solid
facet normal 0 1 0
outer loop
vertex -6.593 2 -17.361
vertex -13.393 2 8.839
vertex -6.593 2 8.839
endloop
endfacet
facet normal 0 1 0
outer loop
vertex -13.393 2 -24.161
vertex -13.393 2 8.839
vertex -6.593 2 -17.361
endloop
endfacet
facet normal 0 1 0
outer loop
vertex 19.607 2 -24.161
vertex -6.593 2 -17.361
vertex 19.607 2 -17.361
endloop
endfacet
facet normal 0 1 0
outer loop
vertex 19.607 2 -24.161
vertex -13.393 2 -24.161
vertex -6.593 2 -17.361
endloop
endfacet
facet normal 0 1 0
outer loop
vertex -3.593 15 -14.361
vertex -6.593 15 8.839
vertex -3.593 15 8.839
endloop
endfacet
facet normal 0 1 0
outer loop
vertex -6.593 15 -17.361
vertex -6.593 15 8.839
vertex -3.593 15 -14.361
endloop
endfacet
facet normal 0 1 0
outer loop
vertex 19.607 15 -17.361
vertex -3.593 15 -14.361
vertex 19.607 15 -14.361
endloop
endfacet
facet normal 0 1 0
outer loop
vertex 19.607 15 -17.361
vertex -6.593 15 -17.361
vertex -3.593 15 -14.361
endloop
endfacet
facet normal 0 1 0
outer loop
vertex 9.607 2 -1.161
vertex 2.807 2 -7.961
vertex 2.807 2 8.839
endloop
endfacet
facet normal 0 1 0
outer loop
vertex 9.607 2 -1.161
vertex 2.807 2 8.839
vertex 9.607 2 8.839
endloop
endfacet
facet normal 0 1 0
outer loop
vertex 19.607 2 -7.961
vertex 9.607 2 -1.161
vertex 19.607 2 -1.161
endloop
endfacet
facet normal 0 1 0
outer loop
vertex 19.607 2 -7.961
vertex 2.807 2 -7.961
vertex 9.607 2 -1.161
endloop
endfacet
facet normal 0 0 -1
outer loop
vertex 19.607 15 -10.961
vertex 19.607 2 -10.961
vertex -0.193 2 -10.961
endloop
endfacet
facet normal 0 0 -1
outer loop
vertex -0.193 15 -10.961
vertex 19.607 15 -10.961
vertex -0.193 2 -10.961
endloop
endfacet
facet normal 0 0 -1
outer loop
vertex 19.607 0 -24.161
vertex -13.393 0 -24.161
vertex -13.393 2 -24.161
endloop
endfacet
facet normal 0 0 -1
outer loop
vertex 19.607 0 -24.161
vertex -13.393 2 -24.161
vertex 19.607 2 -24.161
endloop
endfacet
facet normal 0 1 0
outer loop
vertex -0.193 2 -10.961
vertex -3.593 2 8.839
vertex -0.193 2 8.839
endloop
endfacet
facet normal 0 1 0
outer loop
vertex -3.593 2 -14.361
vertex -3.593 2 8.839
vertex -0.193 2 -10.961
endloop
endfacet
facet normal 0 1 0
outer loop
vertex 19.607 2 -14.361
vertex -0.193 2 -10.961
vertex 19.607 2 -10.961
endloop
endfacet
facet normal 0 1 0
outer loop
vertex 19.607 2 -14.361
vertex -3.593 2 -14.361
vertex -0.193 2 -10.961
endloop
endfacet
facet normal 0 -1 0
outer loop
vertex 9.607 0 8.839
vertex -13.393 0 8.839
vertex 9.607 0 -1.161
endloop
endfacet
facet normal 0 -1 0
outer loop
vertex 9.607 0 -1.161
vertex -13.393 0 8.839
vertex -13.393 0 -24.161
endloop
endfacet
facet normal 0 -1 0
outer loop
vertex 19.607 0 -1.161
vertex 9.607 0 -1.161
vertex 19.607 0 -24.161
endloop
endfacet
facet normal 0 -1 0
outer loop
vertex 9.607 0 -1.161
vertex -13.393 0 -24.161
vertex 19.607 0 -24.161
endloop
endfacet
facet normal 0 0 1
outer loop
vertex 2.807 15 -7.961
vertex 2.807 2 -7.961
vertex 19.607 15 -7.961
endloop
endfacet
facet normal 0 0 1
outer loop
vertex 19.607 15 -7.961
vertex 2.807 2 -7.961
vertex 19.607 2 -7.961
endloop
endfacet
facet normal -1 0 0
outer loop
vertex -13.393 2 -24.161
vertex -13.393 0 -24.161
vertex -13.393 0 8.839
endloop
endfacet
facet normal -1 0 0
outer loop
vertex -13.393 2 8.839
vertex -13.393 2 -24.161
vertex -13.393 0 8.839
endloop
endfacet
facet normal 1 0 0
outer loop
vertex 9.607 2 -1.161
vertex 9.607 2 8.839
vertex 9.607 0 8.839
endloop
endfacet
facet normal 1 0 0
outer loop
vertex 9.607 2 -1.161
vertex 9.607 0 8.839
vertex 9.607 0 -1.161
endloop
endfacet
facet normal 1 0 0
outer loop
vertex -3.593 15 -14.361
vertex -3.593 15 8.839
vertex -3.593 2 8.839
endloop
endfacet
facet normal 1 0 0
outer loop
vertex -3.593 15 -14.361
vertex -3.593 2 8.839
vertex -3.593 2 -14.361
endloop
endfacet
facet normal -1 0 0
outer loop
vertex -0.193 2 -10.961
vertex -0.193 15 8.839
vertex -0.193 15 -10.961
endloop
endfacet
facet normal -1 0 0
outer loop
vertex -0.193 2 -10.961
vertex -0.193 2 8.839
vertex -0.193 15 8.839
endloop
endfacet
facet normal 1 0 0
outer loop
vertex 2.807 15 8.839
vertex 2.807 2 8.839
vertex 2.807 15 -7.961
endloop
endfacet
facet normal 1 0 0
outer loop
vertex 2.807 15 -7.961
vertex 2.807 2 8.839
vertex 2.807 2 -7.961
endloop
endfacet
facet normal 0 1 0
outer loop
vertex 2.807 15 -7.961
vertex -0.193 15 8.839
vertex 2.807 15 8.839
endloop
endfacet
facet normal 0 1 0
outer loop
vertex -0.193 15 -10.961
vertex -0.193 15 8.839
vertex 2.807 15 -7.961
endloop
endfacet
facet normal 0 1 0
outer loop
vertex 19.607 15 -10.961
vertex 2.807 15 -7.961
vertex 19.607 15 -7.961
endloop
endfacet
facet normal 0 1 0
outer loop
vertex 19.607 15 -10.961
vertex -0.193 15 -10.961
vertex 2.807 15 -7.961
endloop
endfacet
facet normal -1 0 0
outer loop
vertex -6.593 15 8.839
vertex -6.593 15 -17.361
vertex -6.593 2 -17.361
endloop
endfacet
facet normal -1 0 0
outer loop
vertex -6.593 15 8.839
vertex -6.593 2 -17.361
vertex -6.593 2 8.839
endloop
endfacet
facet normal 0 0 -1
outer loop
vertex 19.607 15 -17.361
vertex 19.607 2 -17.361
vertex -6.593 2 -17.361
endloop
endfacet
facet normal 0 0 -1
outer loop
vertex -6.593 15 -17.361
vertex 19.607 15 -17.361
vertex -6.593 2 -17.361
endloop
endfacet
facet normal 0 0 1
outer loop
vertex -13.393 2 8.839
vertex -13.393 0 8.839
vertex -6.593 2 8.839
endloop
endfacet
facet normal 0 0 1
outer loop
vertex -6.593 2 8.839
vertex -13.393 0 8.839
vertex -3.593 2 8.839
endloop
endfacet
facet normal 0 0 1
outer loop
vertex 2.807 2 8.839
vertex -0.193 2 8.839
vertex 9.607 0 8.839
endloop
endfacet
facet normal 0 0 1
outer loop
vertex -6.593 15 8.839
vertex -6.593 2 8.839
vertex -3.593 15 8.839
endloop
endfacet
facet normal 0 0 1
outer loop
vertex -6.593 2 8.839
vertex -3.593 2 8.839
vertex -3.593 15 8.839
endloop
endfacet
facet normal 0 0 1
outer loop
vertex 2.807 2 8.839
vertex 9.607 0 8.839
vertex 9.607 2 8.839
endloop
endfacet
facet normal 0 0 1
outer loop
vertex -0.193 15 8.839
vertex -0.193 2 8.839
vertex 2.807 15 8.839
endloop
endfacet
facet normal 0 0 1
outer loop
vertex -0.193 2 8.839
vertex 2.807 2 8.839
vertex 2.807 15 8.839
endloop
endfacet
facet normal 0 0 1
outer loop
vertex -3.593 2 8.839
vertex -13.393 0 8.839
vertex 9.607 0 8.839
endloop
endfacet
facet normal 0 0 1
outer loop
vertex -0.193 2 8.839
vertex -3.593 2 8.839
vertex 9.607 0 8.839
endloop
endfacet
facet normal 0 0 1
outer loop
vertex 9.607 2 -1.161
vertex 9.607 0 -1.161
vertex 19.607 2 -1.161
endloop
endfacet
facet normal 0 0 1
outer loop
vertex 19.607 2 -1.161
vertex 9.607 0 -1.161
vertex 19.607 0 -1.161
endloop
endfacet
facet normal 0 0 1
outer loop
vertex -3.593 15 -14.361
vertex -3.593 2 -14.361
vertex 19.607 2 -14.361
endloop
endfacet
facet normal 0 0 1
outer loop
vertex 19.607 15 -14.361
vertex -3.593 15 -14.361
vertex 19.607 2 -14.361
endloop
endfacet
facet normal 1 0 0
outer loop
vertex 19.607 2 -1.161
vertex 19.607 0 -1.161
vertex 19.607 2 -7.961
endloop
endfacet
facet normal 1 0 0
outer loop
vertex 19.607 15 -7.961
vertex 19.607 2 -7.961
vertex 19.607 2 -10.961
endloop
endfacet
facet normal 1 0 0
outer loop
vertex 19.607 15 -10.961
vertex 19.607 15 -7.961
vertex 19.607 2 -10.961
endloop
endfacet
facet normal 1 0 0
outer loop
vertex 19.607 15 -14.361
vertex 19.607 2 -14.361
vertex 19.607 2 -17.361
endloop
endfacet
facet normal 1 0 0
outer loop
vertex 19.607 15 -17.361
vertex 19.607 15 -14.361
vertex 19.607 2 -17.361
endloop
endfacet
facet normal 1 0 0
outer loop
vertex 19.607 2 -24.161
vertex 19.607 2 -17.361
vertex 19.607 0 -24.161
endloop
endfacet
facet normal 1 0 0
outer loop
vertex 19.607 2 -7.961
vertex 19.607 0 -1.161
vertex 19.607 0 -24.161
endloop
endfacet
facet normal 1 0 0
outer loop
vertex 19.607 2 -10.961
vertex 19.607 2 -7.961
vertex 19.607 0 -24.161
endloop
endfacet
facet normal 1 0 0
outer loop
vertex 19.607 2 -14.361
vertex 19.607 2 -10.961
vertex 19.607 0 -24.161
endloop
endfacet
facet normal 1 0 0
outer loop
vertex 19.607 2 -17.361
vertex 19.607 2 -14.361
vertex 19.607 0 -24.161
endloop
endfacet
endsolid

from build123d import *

# Parameters (mm, degrees)
ESQUISSE1_W              = 13
ESQUISSE1_H              = 20
BOSS_EXTRU_1_DEPTH       = 15
ESQUISSE2_W              = 2
ESQUISSE2_H              = 20
ESQUISSE2_W_2            = 3
ENL_V_MAT_EXTRU_2_DEPTH  = 13
ESQUISSE4_W              = 20
ESQUISSE4_H              = 2
BOSS_EXTRU_2_DEPTH       = 5
ESQUISSE5_W              = 20
ESQUISSE5_H              = 2
BOSS_EXTRU_3_DEPTH       = 5
ESQUISSE6_W              = 20
ESQUISSE6_H              = 13
ENL_V_MAT_EXTRU_3_DEPTH  = 0.2
ESQUISSE7_W              = 20
ESQUISSE7_H              = 13
ENL_V_MAT_EXTRU_4_DEPTH  = 0.2
ESQUISSE8_W              = 20
ESQUISSE8_H              = 13
BOSS_EXTRU_4_DEPTH       = 0.2
ESQUISSE9_W              = 20
ESQUISSE9_H              = 13
BOSS_EXTRU_5_DEPTH       = 0.2
ENL_V_MAT_EXTRU_5_DEPTH  = 10
BOSS_EXTRU_6_DEPTH       = 2
ESQUISSE13_W             = 3
ESQUISSE13_H             = 23
BOSS_EXTRU_7_DEPTH       = 13
ESQUISSE14_W             = 16.8
ESQUISSE14_H             = 3
ESQUISSE14_W_2           = 16.2
BOSS_EXTRU_8_DEPTH       = 13
ESQUISSE18_W             = 3.4
ESQUISSE18_H             = 13
ENL_V_MAT_EXTRU_8_DEPTH  = 10
ESQUISSE19_W             = 6.8
ESQUISSE19_H             = 13
ENL_V_MAT_EXTRU_9_DEPTH  = 10
ESQUISSE20_W             = 6.8
ESQUISSE20_H             = 13
ENL_V_MAT_EXTRU_10_DEPTH = 10
ESQUISSE21_W             = 3.4
ESQUISSE21_H             = 13
ENL_V_MAT_EXTRU_11_DEPTH = 5


with BuildPart() as part:
    # Esquisse1 → Boss.-Extru.1 (new body)
    with BuildSketch(Plane(origin=(0, 0, 0), x_dir=(1, 0, 0), z_dir=(0, 1, 0))):
        with Locations((-1.892857143, 1.160714286)):
            Rectangle(ESQUISSE1_W, ESQUISSE1_H)
    extrude(amount=BOSS_EXTRU_1_DEPTH)

    # Esquisse2 → Enlèv. mat.-Extru.2 (cut)
    with BuildSketch(Plane(origin=(0, 15, 0), x_dir=(1, 0, 0), z_dir=(0, 1, 0))):
        with Locations((-7.392857143, 1.160714286)):
            Rectangle(ESQUISSE2_W, ESQUISSE2_H)
        with Locations((-1.892857143, 1.160714286)):
            Rectangle(ESQUISSE2_W_2, ESQUISSE2_H)
        with Locations((3.607142857, 1.160714286)):
            Rectangle(ESQUISSE2_W, ESQUISSE2_H)
    extrude(amount=-ENL_V_MAT_EXTRU_2_DEPTH, mode=Mode.SUBTRACT)

    # Esquisse4 → Boss.-Extru.2 (add)
    with BuildSketch(Plane.ZY.offset(8.392857143)):
        with Locations((-1.160714286, 1)):
            Rectangle(ESQUISSE4_W, ESQUISSE4_H)
    extrude(amount=BOSS_EXTRU_2_DEPTH)

    # Esquisse5 → Boss.-Extru.3 (add)
    with BuildSketch(Plane(origin=(4.607142857, 0, 0), x_dir=(0, 0, -1), z_dir=(1, 0, 0))):
        with Locations((1.160714286, 1)):
            Rectangle(ESQUISSE5_W, ESQUISSE5_H)
    extrude(amount=BOSS_EXTRU_3_DEPTH)

    # Esquisse6 → Enlèv. mat.-Extru.3 (cut)
    with BuildSketch(Plane.ZY.offset(0.392857143)):
        with Locations((-1.160714286, 8.5)):
            Rectangle(ESQUISSE6_W, ESQUISSE6_H)
    extrude(amount=-ENL_V_MAT_EXTRU_3_DEPTH, mode=Mode.SUBTRACT)

    # Esquisse7 → Enlèv. mat.-Extru.4 (cut)
    with BuildSketch(Plane(origin=(-3.392857143, 0, 0), x_dir=(0, 0, -1), z_dir=(1, 0, 0))):
        with Locations((1.160714286, 8.5)):
            Rectangle(ESQUISSE7_W, ESQUISSE7_H)
    extrude(amount=-ENL_V_MAT_EXTRU_4_DEPTH, mode=Mode.SUBTRACT)

    # Esquisse8 → Boss.-Extru.4 (add)
    with BuildSketch(Plane(origin=(2.607142857, 0, 0), x_dir=(0, 0, -1), z_dir=(1, 0, 0))):
        with Locations((1.160714286, 8.5)):
            Rectangle(ESQUISSE8_W, ESQUISSE8_H)
    extrude(amount=BOSS_EXTRU_4_DEPTH)

    # Esquisse9 → Boss.-Extru.5 (add)
    with BuildSketch(Plane.ZY.offset(6.392857143)):
        with Locations((-1.160714286, 8.5)):
            Rectangle(ESQUISSE9_W, ESQUISSE9_H)
    extrude(amount=BOSS_EXTRU_5_DEPTH)

    # Esquisse11 → Enlèv. mat.-Extru.5 (cut)
    with BuildSketch(Plane(origin=(0, 0, -11.160714286), x_dir=(-1, 0, 0), z_dir=(0, 0, -1))):
        Polygon((6.592857143, 2), (6.592857143, 15), (3.592857143, 15), (3.592857143, 2), (0.192857143, 2), (0.192857143, 15), (-2.807142857, 15), (-2.807142857, 2), (-9.607142857, 2), (-9.607142857, 0), (13.392857143, 0), (13.392857143, 2), align=None)
    extrude(amount=-ENL_V_MAT_EXTRU_5_DEPTH, mode=Mode.SUBTRACT)

    # Esquisse12 → Boss.-Extru.6 (add)
    with BuildSketch(Plane(origin=(0, 0, 0), x_dir=(1, 0, 0), z_dir=(0, 1, 0))):
        Polygon((9.607142857, 1.160714286), (19.607142857, 1.160714286), (19.607142857, 24.160714286), (-13.392857143, 24.160714286), (-13.392857143, 1.160714286), align=None)
    extrude(amount=BOSS_EXTRU_6_DEPTH)

    # Esquisse13 → Boss.-Extru.7 (add)
    with BuildSketch(Plane(origin=(0, 2, 0), x_dir=(1, 0, 0), z_dir=(0, 1, 0))):
        Polygon((2.807142857, 1.160714286), (-0.192857143, 1.160714286), (-0.192857143, 24.160714286), (2.807142857, 24.160714286), (2.807142857, 1.789853377), align=None)
        with Locations((-5.092857143, 12.660714286)):
            Rectangle(ESQUISSE13_W, ESQUISSE13_H)
    extrude(amount=BOSS_EXTRU_7_DEPTH)

    # Esquisse14 → Boss.-Extru.8 (add)
    with BuildSketch(Plane(origin=(0, 2, 0), x_dir=(1, 0, 0), z_dir=(0, 1, 0))):
        with Locations((11.207142857, 9.460714286)):
            Rectangle(ESQUISSE14_W, ESQUISSE14_H)
        with Locations((11.207142857, 15.860714286)):
            Rectangle(ESQUISSE14_W, ESQUISSE14_H)
        with Locations((-5.292857143, 9.460714286)):
            Rectangle(ESQUISSE14_W_2, ESQUISSE14_H)
        with Locations((-5.292857143, 15.860714286)):
            Rectangle(ESQUISSE14_W_2, ESQUISSE14_H)
    extrude(amount=BOSS_EXTRU_8_DEPTH)

    # Esquisse18 → Enlèv. mat.-Extru.8 (cut)
    with BuildSketch(Plane(origin=(0, 0, -10.960714286), x_dir=(-1, 0, 0), z_dir=(0, 0, -1))):
        with Locations((1.892857143, 8.5)):
            Rectangle(ESQUISSE18_W, ESQUISSE18_H)
    extrude(amount=-ENL_V_MAT_EXTRU_8_DEPTH, mode=Mode.SUBTRACT)

    # Esquisse19 → Enlèv. mat.-Extru.9 (cut)
    with BuildSketch(Plane(origin=(0, 0, -17.360714286), x_dir=(-1, 0, 0), z_dir=(0, 0, -1))):
        with Locations((9.992857143, 8.5)):
            Rectangle(ESQUISSE19_W, ESQUISSE19_H)
    extrude(amount=-ENL_V_MAT_EXTRU_9_DEPTH, mode=Mode.SUBTRACT)

    # Esquisse20 → Enlèv. mat.-Extru.10 (cut)
    with BuildSketch(Plane(origin=(2.807142857, 0, 0), x_dir=(0, 0, -1), z_dir=(1, 0, 0))):
        with Locations((20.760714286, 8.5)):
            Rectangle(ESQUISSE20_W, ESQUISSE20_H)
    extrude(amount=-ENL_V_MAT_EXTRU_10_DEPTH, mode=Mode.SUBTRACT)

    # Esquisse21 → Enlèv. mat.-Extru.11 (cut)
    with BuildSketch(Plane(origin=(2.807142857, 0, 0), x_dir=(0, 0, -1), z_dir=(1, 0, 0))):
        with Locations((12.660714286, 8.5)):
            Rectangle(ESQUISSE21_W, ESQUISSE21_H)
    extrude(amount=-ENL_V_MAT_EXTRU_11_DEPTH, mode=Mode.SUBTRACT)


solid = part.part
